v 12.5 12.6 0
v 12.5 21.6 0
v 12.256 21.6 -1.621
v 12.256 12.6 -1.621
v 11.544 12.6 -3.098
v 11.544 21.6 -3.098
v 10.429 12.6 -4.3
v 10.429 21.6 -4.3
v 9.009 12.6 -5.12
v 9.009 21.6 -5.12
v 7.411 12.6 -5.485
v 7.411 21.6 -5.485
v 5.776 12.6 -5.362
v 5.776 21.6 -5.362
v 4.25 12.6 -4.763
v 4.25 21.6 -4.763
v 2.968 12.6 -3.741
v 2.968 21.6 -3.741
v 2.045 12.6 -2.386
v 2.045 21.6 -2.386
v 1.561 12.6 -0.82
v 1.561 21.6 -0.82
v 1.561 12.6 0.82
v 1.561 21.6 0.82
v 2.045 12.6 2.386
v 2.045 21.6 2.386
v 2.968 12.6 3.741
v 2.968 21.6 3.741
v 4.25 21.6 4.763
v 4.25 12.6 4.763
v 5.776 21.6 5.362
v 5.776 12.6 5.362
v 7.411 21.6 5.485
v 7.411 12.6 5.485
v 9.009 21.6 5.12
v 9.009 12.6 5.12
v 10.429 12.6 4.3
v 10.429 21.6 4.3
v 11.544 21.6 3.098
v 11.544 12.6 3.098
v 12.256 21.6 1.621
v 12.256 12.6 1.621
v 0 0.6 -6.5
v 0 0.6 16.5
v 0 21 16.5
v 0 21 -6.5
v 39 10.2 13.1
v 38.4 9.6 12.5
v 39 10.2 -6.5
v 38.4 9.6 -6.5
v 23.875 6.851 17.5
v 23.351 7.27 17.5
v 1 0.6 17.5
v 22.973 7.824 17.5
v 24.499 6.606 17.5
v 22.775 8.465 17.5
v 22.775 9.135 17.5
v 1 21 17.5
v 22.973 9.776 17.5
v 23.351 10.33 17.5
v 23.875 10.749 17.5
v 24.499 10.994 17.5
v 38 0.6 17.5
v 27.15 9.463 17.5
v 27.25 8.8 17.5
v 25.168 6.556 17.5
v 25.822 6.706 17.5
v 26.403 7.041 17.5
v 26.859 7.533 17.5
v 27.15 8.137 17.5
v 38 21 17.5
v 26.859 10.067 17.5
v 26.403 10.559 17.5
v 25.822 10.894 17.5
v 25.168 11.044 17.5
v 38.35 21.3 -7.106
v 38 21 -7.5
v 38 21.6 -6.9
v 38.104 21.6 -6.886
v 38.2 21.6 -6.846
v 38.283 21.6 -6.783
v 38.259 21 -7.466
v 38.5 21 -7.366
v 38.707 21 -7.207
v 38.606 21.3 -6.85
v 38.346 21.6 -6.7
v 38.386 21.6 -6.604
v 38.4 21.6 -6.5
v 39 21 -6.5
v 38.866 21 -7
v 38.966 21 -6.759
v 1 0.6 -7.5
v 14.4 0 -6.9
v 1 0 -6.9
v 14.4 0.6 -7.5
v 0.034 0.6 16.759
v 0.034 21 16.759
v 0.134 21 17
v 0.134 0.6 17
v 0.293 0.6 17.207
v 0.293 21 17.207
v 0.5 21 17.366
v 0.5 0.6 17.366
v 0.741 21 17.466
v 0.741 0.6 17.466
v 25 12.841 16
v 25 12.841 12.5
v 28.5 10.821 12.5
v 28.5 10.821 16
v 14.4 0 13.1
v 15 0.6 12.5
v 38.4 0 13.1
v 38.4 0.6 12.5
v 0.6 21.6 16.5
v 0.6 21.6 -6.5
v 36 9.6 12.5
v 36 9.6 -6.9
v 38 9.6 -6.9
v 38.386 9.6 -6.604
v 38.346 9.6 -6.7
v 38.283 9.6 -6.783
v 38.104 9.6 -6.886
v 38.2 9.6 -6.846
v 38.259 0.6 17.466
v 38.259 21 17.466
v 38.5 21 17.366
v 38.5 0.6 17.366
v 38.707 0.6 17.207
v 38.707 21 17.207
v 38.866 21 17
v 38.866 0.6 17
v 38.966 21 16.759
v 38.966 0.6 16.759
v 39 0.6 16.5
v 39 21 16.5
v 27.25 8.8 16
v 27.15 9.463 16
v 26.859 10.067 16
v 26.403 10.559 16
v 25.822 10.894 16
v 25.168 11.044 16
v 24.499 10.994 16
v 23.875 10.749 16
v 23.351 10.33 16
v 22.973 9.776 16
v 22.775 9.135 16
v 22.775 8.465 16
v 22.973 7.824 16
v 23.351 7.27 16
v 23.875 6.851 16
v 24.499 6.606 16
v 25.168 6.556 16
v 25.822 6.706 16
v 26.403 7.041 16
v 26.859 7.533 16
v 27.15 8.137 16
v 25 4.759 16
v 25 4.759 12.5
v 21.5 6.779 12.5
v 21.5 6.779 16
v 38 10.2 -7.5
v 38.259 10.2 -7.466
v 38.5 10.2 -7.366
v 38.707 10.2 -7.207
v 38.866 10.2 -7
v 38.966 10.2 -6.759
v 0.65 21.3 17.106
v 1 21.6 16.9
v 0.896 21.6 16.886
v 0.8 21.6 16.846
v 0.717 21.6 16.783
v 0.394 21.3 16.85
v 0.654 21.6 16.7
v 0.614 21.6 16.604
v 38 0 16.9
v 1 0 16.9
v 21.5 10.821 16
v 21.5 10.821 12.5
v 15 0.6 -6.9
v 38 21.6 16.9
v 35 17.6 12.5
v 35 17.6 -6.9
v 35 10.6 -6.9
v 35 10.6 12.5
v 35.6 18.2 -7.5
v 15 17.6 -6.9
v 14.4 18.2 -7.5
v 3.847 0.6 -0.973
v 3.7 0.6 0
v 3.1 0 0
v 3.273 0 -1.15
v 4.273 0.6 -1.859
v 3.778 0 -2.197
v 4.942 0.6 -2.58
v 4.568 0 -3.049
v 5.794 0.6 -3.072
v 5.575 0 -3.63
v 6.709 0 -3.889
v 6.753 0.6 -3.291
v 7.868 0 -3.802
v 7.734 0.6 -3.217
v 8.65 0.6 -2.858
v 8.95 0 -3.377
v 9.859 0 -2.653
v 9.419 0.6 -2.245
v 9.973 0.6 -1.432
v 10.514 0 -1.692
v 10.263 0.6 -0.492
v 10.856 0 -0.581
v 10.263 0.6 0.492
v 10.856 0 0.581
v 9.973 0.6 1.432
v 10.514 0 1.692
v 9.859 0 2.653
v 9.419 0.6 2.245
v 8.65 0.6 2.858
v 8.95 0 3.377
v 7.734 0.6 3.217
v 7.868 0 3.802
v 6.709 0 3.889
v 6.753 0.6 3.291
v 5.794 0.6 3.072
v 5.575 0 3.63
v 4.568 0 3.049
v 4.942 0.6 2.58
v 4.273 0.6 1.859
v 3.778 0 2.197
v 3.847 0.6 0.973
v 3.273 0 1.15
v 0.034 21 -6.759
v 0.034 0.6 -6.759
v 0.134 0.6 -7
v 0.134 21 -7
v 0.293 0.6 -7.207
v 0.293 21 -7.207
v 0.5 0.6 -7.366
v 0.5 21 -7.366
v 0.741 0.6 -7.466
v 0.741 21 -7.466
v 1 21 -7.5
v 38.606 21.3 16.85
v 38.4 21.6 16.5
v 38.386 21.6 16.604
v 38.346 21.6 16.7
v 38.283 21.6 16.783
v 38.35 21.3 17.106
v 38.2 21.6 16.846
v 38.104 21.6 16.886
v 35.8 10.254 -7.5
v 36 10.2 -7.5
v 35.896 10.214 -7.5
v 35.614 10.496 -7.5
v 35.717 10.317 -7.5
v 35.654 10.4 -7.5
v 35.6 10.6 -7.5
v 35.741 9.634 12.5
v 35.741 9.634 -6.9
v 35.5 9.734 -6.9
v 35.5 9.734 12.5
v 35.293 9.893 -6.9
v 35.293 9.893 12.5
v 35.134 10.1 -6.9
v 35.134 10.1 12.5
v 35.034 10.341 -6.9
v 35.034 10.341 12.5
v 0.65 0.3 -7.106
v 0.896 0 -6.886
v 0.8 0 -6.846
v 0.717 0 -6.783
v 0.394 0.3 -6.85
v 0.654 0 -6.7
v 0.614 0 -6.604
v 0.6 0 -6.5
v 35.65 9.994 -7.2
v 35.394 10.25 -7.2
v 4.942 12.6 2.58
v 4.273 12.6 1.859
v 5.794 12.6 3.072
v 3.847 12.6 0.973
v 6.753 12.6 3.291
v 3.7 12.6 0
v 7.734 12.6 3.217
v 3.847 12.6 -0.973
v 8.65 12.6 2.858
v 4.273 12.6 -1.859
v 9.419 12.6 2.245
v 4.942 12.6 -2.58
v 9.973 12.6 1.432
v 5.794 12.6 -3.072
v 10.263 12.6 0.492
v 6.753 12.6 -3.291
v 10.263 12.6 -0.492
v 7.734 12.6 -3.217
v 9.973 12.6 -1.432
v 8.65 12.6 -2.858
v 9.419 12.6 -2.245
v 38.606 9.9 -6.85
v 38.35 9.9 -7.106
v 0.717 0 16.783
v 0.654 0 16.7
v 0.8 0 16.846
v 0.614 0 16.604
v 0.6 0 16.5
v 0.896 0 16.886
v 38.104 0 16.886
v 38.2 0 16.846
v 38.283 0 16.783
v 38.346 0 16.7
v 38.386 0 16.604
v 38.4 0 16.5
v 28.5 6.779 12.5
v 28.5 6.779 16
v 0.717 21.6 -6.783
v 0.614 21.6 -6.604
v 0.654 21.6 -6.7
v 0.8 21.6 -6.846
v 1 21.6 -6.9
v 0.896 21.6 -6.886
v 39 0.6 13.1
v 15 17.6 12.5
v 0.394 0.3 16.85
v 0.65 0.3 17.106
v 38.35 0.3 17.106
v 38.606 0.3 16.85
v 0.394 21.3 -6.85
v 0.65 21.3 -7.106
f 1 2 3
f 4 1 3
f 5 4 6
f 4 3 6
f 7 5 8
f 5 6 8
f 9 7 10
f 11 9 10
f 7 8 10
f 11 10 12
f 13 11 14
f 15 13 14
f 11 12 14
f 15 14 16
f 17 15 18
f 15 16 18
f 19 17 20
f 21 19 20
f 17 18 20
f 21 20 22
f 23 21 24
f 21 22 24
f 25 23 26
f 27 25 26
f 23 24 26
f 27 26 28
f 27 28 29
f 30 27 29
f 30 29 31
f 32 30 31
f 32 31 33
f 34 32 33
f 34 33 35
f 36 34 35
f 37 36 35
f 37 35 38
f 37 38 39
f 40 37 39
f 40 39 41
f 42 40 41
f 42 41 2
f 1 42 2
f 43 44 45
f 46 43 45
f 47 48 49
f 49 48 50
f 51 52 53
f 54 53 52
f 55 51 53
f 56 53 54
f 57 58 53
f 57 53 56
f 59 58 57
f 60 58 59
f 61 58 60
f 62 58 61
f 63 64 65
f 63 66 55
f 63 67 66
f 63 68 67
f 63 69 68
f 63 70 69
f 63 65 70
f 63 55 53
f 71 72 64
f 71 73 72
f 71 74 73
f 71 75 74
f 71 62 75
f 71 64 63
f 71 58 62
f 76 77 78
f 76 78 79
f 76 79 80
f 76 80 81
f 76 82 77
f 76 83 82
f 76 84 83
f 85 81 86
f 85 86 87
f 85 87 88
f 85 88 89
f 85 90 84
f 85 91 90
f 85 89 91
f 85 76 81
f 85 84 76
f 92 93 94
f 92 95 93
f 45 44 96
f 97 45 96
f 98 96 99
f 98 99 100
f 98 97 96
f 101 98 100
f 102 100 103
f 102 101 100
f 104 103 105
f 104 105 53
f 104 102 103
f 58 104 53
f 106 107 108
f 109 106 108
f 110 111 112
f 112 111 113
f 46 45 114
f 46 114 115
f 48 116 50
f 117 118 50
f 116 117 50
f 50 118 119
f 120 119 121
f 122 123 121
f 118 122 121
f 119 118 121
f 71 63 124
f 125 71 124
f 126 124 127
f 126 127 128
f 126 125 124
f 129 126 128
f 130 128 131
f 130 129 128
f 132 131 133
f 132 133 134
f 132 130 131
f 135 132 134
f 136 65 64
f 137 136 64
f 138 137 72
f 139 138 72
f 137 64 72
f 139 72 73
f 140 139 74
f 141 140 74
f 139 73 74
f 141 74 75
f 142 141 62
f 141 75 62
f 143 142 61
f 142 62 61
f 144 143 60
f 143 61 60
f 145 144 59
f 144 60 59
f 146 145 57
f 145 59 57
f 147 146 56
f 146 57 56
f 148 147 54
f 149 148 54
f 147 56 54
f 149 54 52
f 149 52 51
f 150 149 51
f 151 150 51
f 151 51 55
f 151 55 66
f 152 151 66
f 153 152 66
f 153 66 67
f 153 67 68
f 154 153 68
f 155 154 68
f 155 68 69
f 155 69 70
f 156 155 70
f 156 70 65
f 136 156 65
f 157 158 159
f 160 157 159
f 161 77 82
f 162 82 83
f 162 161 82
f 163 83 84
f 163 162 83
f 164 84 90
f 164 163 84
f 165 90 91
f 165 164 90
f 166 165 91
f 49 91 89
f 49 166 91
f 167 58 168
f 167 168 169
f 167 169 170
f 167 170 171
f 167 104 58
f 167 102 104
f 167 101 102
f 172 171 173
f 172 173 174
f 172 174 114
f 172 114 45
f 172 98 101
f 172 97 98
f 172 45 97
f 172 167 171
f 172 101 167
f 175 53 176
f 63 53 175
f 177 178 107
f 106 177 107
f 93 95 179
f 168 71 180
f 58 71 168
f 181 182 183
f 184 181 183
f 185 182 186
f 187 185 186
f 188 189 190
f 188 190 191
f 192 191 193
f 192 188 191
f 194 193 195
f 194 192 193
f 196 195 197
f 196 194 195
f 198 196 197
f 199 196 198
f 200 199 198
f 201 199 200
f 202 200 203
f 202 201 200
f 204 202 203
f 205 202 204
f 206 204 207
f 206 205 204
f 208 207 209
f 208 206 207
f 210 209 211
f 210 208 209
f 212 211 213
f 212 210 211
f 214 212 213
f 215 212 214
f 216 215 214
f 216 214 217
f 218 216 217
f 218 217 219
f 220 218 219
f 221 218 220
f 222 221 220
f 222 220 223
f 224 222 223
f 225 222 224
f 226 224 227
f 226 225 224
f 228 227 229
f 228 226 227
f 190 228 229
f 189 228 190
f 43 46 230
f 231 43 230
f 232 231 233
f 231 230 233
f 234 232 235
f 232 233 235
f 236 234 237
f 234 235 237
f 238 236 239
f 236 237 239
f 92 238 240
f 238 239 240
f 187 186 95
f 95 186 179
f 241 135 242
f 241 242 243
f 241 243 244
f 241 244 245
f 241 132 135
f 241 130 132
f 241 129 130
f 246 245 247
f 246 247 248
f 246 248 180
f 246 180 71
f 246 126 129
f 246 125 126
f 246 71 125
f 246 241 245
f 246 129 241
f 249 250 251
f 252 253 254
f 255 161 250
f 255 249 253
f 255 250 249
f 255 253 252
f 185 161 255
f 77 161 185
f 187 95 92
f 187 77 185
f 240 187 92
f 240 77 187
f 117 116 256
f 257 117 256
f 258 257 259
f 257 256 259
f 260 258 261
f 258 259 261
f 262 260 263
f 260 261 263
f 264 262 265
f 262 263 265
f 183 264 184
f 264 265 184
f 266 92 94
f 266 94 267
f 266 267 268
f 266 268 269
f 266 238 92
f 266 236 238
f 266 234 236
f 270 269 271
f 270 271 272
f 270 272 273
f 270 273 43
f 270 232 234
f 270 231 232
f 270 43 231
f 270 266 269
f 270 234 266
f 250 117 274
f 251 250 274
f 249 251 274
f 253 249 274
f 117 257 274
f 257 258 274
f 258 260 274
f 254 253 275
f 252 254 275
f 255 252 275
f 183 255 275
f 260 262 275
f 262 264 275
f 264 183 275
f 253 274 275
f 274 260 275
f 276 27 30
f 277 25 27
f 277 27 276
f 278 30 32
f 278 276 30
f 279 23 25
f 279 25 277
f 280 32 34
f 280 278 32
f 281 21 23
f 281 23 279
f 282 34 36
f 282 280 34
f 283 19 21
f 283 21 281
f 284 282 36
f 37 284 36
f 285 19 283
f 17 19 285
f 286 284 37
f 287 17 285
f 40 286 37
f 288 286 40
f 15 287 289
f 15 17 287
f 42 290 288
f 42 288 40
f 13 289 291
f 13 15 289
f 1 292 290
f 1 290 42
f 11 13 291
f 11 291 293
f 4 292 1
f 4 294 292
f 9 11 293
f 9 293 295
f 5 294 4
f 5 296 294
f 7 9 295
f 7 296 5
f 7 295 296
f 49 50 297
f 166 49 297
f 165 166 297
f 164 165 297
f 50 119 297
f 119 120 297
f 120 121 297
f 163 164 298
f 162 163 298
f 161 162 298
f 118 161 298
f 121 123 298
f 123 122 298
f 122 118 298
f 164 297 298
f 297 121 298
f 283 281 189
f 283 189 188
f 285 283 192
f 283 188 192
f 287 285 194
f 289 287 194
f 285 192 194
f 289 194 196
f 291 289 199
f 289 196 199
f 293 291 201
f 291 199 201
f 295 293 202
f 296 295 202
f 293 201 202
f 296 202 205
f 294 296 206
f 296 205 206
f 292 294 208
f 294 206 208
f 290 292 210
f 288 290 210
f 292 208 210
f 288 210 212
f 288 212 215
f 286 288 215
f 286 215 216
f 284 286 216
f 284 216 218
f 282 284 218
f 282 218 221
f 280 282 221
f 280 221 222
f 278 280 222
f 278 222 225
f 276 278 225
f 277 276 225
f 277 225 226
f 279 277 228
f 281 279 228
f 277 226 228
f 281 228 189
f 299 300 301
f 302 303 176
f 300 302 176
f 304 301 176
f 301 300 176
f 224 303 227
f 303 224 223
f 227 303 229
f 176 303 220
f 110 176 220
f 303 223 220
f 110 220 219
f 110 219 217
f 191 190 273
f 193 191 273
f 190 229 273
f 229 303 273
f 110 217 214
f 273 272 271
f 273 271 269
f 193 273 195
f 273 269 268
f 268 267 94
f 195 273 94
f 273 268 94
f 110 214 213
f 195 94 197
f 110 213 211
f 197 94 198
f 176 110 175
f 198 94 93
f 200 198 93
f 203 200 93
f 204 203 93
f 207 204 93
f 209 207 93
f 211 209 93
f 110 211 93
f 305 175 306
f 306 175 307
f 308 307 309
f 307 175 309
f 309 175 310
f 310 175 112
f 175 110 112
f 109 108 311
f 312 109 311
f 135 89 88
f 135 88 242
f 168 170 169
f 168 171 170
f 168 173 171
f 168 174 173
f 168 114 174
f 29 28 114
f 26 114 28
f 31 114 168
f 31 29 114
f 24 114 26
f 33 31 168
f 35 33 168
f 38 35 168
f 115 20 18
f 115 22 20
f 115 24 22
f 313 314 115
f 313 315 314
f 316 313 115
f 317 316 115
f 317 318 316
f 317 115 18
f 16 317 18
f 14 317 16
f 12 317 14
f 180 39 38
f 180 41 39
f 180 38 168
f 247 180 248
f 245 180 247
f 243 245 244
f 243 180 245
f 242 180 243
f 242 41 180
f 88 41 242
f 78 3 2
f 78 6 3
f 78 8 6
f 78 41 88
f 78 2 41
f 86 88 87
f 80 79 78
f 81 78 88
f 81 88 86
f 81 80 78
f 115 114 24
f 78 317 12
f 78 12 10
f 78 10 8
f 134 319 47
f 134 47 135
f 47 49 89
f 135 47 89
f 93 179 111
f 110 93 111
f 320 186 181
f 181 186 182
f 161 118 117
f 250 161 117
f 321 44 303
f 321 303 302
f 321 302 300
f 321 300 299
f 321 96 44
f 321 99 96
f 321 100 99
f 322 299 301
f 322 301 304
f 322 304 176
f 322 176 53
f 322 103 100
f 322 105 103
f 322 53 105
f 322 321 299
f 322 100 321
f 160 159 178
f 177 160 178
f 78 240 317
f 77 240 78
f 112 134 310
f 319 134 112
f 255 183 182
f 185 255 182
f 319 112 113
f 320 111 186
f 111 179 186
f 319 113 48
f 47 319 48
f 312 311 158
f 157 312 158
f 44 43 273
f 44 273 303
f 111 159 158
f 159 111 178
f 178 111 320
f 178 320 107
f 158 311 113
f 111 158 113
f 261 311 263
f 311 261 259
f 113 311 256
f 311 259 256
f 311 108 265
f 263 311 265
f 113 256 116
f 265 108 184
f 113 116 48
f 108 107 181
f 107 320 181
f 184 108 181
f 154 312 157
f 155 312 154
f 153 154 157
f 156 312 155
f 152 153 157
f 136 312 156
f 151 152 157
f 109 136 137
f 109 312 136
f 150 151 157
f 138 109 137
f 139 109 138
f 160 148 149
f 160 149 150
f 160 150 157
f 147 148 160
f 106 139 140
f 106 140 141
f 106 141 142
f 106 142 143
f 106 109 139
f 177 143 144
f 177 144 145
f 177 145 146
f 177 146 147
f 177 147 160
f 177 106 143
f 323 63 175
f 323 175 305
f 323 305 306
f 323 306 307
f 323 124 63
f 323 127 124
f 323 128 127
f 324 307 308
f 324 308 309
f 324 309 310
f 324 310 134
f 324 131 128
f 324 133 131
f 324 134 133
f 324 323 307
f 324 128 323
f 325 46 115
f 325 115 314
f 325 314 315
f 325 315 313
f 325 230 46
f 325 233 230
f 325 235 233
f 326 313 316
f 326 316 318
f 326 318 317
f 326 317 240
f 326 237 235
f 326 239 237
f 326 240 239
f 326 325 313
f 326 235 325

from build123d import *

# Parameters (mm, degrees)
BOSS_EXTRUDE1_DEPTH                                 = 7.5
CBORE_FOR_M6_HEX_SOCKET_HEAD_CAP_SCREW1_D           = 6.6
CBORE_FOR_M6_HEX_SOCKET_HEAD_CAP_SCREW1_CBORE_D     = 11
CBORE_FOR_M6_HEX_SOCKET_HEAD_CAP_SCREW1_CBORE_DEPTH = 9
BOSS_EXTRUDE2_DEPTH                                 = 5
SKETCH6_W                                           = 39
SKETCH6_H                                           = 21.6
BOSS_EXTRUDE3_DEPTH                                 = 5
CUT_EXTRUDE1_DEPTH                                  = 3.5
M4_CLEARANCE_HOLE1_D                                = 4.5
FILLET1_R                                           = 1
CHAMFER1_SIZE                                       = 0.6


with BuildPart() as part:
    # Sketch1 → Boss-Extrude1 (new, symmetric)
    with BuildSketch(Plane.XY):
        Polygon((0, 0), (0, 21.6), (39, 21.6), (39, 9.6), (35, 9.6), (35, 17.6), (15, 17.6), (15, 0), align=None)
    extrude(amount=BOSS_EXTRUDE1_DEPTH, both=True)

    # CBORE for M6 Hex Socket Head Cap Screw1 (through all)
    with Locations(Plane(origin=(0, 21.6, 0), x_dir=(1, 0, 0), z_dir=(0, 1, 0))):
        with Locations((7, 0)):
            CounterBoreHole(CBORE_FOR_M6_HEX_SOCKET_HEAD_CAP_SCREW1_D / 2, CBORE_FOR_M6_HEX_SOCKET_HEAD_CAP_SCREW1_CBORE_D / 2, CBORE_FOR_M6_HEX_SOCKET_HEAD_CAP_SCREW1_CBORE_DEPTH)

    # Sketch5 → Boss-Extrude2 (add)
    with BuildSketch(Plane.XY.offset(7.5)):
        Polygon((0, 0), (15, 0), (15, 17.6), (35, 17.6), (35, 9.6), (39, 9.6), (39, 21.6), (0, 21.6), align=None)
    extrude(amount=BOSS_EXTRUDE2_DEPTH)

    # Sketch6 → Boss-Extrude3 (add)
    with BuildSketch(Plane.XY.offset(12.5)):
        with Locations((19.5, 10.8)):
            Rectangle(SKETCH6_W, SKETCH6_H)
    extrude(amount=BOSS_EXTRUDE3_DEPTH)

    # Sketch7 → Cut-Extrude1 (cut)
    with BuildSketch(Plane(origin=(0, 0, 12.5), x_dir=(-1, 0, 0), z_dir=(0, 0, -1))):
        Polygon((-25, 4.758548116), (-21.5, 6.779274058), (-21.5, 10.820725942), (-25, 12.841451884), (-28.5, 10.820725942), (-28.5, 6.779274058), align=None)
    extrude(amount=-CUT_EXTRUDE1_DEPTH, mode=Mode.SUBTRACT)

    # M4 Clearance Hole1 (through all)
    with Locations(Plane(origin=(0, 0, 16), x_dir=(-1, 0, 0), z_dir=(0, 0, -1))):
        with Locations((-25, 8.8)):
            Hole(M4_CLEARANCE_HOLE1_D / 2)

    # Fillet1
    fillet1_edges = [part.edges().sort_by_distance(p)[0] for p in [
        (35, 9.6, 2.5),
        (0, 10.8, 17.5),
        (39, 10.8, 17.5),
        (0, 10.8, -7.5),
        (39, 15.6, -7.5),
    ]]
    fillet(fillet1_edges, radius=FILLET1_R)

    # Chamfer1
    chamfer1_edges = [part.edges().sort_by_distance(p)[0] for p in [
        (0.292893219, 21.6, -7.207106781),
        (38.707106781, 21.6, 17.207106781),
        (35, 14.1, -7.5),
        (38.707106781, 21.6, -7.207106781),
        (8, 0, -7.5),
        (37, 9.6, -7.5),
        (35.292893219, 9.892893219, -7.5),
        (25, 17.6, -7.5),
        (38.707106781, 9.6, -7.207106781),
        (19.5, 0, 17.5),
        (0, 0, 5),
        (15, 8.8, -7.5),
        (0.292893219, 0, 17.207106781),
        (0.292893219, 0, -7.207106781),
        (38.707106781, 0, 17.207106781),
        (39, 9.6, 3),
        (15, 0, 2.5),
        (10.3, 0, 0),
        (27, 0, 12.5),
        (39, 4.8, 12.5),
        (39, 21.6, 5),
        (39, 0, 14.5),
        (19.5, 21.6, -7.5),
        (0, 21.6, 5),
        (19.5, 21.6, 17.5),
        (0.292893219, 21.6, 17.207106781),
    ]]
    chamfer(chamfer1_edges, length=CHAMFER1_SIZE)


solid = part.part
